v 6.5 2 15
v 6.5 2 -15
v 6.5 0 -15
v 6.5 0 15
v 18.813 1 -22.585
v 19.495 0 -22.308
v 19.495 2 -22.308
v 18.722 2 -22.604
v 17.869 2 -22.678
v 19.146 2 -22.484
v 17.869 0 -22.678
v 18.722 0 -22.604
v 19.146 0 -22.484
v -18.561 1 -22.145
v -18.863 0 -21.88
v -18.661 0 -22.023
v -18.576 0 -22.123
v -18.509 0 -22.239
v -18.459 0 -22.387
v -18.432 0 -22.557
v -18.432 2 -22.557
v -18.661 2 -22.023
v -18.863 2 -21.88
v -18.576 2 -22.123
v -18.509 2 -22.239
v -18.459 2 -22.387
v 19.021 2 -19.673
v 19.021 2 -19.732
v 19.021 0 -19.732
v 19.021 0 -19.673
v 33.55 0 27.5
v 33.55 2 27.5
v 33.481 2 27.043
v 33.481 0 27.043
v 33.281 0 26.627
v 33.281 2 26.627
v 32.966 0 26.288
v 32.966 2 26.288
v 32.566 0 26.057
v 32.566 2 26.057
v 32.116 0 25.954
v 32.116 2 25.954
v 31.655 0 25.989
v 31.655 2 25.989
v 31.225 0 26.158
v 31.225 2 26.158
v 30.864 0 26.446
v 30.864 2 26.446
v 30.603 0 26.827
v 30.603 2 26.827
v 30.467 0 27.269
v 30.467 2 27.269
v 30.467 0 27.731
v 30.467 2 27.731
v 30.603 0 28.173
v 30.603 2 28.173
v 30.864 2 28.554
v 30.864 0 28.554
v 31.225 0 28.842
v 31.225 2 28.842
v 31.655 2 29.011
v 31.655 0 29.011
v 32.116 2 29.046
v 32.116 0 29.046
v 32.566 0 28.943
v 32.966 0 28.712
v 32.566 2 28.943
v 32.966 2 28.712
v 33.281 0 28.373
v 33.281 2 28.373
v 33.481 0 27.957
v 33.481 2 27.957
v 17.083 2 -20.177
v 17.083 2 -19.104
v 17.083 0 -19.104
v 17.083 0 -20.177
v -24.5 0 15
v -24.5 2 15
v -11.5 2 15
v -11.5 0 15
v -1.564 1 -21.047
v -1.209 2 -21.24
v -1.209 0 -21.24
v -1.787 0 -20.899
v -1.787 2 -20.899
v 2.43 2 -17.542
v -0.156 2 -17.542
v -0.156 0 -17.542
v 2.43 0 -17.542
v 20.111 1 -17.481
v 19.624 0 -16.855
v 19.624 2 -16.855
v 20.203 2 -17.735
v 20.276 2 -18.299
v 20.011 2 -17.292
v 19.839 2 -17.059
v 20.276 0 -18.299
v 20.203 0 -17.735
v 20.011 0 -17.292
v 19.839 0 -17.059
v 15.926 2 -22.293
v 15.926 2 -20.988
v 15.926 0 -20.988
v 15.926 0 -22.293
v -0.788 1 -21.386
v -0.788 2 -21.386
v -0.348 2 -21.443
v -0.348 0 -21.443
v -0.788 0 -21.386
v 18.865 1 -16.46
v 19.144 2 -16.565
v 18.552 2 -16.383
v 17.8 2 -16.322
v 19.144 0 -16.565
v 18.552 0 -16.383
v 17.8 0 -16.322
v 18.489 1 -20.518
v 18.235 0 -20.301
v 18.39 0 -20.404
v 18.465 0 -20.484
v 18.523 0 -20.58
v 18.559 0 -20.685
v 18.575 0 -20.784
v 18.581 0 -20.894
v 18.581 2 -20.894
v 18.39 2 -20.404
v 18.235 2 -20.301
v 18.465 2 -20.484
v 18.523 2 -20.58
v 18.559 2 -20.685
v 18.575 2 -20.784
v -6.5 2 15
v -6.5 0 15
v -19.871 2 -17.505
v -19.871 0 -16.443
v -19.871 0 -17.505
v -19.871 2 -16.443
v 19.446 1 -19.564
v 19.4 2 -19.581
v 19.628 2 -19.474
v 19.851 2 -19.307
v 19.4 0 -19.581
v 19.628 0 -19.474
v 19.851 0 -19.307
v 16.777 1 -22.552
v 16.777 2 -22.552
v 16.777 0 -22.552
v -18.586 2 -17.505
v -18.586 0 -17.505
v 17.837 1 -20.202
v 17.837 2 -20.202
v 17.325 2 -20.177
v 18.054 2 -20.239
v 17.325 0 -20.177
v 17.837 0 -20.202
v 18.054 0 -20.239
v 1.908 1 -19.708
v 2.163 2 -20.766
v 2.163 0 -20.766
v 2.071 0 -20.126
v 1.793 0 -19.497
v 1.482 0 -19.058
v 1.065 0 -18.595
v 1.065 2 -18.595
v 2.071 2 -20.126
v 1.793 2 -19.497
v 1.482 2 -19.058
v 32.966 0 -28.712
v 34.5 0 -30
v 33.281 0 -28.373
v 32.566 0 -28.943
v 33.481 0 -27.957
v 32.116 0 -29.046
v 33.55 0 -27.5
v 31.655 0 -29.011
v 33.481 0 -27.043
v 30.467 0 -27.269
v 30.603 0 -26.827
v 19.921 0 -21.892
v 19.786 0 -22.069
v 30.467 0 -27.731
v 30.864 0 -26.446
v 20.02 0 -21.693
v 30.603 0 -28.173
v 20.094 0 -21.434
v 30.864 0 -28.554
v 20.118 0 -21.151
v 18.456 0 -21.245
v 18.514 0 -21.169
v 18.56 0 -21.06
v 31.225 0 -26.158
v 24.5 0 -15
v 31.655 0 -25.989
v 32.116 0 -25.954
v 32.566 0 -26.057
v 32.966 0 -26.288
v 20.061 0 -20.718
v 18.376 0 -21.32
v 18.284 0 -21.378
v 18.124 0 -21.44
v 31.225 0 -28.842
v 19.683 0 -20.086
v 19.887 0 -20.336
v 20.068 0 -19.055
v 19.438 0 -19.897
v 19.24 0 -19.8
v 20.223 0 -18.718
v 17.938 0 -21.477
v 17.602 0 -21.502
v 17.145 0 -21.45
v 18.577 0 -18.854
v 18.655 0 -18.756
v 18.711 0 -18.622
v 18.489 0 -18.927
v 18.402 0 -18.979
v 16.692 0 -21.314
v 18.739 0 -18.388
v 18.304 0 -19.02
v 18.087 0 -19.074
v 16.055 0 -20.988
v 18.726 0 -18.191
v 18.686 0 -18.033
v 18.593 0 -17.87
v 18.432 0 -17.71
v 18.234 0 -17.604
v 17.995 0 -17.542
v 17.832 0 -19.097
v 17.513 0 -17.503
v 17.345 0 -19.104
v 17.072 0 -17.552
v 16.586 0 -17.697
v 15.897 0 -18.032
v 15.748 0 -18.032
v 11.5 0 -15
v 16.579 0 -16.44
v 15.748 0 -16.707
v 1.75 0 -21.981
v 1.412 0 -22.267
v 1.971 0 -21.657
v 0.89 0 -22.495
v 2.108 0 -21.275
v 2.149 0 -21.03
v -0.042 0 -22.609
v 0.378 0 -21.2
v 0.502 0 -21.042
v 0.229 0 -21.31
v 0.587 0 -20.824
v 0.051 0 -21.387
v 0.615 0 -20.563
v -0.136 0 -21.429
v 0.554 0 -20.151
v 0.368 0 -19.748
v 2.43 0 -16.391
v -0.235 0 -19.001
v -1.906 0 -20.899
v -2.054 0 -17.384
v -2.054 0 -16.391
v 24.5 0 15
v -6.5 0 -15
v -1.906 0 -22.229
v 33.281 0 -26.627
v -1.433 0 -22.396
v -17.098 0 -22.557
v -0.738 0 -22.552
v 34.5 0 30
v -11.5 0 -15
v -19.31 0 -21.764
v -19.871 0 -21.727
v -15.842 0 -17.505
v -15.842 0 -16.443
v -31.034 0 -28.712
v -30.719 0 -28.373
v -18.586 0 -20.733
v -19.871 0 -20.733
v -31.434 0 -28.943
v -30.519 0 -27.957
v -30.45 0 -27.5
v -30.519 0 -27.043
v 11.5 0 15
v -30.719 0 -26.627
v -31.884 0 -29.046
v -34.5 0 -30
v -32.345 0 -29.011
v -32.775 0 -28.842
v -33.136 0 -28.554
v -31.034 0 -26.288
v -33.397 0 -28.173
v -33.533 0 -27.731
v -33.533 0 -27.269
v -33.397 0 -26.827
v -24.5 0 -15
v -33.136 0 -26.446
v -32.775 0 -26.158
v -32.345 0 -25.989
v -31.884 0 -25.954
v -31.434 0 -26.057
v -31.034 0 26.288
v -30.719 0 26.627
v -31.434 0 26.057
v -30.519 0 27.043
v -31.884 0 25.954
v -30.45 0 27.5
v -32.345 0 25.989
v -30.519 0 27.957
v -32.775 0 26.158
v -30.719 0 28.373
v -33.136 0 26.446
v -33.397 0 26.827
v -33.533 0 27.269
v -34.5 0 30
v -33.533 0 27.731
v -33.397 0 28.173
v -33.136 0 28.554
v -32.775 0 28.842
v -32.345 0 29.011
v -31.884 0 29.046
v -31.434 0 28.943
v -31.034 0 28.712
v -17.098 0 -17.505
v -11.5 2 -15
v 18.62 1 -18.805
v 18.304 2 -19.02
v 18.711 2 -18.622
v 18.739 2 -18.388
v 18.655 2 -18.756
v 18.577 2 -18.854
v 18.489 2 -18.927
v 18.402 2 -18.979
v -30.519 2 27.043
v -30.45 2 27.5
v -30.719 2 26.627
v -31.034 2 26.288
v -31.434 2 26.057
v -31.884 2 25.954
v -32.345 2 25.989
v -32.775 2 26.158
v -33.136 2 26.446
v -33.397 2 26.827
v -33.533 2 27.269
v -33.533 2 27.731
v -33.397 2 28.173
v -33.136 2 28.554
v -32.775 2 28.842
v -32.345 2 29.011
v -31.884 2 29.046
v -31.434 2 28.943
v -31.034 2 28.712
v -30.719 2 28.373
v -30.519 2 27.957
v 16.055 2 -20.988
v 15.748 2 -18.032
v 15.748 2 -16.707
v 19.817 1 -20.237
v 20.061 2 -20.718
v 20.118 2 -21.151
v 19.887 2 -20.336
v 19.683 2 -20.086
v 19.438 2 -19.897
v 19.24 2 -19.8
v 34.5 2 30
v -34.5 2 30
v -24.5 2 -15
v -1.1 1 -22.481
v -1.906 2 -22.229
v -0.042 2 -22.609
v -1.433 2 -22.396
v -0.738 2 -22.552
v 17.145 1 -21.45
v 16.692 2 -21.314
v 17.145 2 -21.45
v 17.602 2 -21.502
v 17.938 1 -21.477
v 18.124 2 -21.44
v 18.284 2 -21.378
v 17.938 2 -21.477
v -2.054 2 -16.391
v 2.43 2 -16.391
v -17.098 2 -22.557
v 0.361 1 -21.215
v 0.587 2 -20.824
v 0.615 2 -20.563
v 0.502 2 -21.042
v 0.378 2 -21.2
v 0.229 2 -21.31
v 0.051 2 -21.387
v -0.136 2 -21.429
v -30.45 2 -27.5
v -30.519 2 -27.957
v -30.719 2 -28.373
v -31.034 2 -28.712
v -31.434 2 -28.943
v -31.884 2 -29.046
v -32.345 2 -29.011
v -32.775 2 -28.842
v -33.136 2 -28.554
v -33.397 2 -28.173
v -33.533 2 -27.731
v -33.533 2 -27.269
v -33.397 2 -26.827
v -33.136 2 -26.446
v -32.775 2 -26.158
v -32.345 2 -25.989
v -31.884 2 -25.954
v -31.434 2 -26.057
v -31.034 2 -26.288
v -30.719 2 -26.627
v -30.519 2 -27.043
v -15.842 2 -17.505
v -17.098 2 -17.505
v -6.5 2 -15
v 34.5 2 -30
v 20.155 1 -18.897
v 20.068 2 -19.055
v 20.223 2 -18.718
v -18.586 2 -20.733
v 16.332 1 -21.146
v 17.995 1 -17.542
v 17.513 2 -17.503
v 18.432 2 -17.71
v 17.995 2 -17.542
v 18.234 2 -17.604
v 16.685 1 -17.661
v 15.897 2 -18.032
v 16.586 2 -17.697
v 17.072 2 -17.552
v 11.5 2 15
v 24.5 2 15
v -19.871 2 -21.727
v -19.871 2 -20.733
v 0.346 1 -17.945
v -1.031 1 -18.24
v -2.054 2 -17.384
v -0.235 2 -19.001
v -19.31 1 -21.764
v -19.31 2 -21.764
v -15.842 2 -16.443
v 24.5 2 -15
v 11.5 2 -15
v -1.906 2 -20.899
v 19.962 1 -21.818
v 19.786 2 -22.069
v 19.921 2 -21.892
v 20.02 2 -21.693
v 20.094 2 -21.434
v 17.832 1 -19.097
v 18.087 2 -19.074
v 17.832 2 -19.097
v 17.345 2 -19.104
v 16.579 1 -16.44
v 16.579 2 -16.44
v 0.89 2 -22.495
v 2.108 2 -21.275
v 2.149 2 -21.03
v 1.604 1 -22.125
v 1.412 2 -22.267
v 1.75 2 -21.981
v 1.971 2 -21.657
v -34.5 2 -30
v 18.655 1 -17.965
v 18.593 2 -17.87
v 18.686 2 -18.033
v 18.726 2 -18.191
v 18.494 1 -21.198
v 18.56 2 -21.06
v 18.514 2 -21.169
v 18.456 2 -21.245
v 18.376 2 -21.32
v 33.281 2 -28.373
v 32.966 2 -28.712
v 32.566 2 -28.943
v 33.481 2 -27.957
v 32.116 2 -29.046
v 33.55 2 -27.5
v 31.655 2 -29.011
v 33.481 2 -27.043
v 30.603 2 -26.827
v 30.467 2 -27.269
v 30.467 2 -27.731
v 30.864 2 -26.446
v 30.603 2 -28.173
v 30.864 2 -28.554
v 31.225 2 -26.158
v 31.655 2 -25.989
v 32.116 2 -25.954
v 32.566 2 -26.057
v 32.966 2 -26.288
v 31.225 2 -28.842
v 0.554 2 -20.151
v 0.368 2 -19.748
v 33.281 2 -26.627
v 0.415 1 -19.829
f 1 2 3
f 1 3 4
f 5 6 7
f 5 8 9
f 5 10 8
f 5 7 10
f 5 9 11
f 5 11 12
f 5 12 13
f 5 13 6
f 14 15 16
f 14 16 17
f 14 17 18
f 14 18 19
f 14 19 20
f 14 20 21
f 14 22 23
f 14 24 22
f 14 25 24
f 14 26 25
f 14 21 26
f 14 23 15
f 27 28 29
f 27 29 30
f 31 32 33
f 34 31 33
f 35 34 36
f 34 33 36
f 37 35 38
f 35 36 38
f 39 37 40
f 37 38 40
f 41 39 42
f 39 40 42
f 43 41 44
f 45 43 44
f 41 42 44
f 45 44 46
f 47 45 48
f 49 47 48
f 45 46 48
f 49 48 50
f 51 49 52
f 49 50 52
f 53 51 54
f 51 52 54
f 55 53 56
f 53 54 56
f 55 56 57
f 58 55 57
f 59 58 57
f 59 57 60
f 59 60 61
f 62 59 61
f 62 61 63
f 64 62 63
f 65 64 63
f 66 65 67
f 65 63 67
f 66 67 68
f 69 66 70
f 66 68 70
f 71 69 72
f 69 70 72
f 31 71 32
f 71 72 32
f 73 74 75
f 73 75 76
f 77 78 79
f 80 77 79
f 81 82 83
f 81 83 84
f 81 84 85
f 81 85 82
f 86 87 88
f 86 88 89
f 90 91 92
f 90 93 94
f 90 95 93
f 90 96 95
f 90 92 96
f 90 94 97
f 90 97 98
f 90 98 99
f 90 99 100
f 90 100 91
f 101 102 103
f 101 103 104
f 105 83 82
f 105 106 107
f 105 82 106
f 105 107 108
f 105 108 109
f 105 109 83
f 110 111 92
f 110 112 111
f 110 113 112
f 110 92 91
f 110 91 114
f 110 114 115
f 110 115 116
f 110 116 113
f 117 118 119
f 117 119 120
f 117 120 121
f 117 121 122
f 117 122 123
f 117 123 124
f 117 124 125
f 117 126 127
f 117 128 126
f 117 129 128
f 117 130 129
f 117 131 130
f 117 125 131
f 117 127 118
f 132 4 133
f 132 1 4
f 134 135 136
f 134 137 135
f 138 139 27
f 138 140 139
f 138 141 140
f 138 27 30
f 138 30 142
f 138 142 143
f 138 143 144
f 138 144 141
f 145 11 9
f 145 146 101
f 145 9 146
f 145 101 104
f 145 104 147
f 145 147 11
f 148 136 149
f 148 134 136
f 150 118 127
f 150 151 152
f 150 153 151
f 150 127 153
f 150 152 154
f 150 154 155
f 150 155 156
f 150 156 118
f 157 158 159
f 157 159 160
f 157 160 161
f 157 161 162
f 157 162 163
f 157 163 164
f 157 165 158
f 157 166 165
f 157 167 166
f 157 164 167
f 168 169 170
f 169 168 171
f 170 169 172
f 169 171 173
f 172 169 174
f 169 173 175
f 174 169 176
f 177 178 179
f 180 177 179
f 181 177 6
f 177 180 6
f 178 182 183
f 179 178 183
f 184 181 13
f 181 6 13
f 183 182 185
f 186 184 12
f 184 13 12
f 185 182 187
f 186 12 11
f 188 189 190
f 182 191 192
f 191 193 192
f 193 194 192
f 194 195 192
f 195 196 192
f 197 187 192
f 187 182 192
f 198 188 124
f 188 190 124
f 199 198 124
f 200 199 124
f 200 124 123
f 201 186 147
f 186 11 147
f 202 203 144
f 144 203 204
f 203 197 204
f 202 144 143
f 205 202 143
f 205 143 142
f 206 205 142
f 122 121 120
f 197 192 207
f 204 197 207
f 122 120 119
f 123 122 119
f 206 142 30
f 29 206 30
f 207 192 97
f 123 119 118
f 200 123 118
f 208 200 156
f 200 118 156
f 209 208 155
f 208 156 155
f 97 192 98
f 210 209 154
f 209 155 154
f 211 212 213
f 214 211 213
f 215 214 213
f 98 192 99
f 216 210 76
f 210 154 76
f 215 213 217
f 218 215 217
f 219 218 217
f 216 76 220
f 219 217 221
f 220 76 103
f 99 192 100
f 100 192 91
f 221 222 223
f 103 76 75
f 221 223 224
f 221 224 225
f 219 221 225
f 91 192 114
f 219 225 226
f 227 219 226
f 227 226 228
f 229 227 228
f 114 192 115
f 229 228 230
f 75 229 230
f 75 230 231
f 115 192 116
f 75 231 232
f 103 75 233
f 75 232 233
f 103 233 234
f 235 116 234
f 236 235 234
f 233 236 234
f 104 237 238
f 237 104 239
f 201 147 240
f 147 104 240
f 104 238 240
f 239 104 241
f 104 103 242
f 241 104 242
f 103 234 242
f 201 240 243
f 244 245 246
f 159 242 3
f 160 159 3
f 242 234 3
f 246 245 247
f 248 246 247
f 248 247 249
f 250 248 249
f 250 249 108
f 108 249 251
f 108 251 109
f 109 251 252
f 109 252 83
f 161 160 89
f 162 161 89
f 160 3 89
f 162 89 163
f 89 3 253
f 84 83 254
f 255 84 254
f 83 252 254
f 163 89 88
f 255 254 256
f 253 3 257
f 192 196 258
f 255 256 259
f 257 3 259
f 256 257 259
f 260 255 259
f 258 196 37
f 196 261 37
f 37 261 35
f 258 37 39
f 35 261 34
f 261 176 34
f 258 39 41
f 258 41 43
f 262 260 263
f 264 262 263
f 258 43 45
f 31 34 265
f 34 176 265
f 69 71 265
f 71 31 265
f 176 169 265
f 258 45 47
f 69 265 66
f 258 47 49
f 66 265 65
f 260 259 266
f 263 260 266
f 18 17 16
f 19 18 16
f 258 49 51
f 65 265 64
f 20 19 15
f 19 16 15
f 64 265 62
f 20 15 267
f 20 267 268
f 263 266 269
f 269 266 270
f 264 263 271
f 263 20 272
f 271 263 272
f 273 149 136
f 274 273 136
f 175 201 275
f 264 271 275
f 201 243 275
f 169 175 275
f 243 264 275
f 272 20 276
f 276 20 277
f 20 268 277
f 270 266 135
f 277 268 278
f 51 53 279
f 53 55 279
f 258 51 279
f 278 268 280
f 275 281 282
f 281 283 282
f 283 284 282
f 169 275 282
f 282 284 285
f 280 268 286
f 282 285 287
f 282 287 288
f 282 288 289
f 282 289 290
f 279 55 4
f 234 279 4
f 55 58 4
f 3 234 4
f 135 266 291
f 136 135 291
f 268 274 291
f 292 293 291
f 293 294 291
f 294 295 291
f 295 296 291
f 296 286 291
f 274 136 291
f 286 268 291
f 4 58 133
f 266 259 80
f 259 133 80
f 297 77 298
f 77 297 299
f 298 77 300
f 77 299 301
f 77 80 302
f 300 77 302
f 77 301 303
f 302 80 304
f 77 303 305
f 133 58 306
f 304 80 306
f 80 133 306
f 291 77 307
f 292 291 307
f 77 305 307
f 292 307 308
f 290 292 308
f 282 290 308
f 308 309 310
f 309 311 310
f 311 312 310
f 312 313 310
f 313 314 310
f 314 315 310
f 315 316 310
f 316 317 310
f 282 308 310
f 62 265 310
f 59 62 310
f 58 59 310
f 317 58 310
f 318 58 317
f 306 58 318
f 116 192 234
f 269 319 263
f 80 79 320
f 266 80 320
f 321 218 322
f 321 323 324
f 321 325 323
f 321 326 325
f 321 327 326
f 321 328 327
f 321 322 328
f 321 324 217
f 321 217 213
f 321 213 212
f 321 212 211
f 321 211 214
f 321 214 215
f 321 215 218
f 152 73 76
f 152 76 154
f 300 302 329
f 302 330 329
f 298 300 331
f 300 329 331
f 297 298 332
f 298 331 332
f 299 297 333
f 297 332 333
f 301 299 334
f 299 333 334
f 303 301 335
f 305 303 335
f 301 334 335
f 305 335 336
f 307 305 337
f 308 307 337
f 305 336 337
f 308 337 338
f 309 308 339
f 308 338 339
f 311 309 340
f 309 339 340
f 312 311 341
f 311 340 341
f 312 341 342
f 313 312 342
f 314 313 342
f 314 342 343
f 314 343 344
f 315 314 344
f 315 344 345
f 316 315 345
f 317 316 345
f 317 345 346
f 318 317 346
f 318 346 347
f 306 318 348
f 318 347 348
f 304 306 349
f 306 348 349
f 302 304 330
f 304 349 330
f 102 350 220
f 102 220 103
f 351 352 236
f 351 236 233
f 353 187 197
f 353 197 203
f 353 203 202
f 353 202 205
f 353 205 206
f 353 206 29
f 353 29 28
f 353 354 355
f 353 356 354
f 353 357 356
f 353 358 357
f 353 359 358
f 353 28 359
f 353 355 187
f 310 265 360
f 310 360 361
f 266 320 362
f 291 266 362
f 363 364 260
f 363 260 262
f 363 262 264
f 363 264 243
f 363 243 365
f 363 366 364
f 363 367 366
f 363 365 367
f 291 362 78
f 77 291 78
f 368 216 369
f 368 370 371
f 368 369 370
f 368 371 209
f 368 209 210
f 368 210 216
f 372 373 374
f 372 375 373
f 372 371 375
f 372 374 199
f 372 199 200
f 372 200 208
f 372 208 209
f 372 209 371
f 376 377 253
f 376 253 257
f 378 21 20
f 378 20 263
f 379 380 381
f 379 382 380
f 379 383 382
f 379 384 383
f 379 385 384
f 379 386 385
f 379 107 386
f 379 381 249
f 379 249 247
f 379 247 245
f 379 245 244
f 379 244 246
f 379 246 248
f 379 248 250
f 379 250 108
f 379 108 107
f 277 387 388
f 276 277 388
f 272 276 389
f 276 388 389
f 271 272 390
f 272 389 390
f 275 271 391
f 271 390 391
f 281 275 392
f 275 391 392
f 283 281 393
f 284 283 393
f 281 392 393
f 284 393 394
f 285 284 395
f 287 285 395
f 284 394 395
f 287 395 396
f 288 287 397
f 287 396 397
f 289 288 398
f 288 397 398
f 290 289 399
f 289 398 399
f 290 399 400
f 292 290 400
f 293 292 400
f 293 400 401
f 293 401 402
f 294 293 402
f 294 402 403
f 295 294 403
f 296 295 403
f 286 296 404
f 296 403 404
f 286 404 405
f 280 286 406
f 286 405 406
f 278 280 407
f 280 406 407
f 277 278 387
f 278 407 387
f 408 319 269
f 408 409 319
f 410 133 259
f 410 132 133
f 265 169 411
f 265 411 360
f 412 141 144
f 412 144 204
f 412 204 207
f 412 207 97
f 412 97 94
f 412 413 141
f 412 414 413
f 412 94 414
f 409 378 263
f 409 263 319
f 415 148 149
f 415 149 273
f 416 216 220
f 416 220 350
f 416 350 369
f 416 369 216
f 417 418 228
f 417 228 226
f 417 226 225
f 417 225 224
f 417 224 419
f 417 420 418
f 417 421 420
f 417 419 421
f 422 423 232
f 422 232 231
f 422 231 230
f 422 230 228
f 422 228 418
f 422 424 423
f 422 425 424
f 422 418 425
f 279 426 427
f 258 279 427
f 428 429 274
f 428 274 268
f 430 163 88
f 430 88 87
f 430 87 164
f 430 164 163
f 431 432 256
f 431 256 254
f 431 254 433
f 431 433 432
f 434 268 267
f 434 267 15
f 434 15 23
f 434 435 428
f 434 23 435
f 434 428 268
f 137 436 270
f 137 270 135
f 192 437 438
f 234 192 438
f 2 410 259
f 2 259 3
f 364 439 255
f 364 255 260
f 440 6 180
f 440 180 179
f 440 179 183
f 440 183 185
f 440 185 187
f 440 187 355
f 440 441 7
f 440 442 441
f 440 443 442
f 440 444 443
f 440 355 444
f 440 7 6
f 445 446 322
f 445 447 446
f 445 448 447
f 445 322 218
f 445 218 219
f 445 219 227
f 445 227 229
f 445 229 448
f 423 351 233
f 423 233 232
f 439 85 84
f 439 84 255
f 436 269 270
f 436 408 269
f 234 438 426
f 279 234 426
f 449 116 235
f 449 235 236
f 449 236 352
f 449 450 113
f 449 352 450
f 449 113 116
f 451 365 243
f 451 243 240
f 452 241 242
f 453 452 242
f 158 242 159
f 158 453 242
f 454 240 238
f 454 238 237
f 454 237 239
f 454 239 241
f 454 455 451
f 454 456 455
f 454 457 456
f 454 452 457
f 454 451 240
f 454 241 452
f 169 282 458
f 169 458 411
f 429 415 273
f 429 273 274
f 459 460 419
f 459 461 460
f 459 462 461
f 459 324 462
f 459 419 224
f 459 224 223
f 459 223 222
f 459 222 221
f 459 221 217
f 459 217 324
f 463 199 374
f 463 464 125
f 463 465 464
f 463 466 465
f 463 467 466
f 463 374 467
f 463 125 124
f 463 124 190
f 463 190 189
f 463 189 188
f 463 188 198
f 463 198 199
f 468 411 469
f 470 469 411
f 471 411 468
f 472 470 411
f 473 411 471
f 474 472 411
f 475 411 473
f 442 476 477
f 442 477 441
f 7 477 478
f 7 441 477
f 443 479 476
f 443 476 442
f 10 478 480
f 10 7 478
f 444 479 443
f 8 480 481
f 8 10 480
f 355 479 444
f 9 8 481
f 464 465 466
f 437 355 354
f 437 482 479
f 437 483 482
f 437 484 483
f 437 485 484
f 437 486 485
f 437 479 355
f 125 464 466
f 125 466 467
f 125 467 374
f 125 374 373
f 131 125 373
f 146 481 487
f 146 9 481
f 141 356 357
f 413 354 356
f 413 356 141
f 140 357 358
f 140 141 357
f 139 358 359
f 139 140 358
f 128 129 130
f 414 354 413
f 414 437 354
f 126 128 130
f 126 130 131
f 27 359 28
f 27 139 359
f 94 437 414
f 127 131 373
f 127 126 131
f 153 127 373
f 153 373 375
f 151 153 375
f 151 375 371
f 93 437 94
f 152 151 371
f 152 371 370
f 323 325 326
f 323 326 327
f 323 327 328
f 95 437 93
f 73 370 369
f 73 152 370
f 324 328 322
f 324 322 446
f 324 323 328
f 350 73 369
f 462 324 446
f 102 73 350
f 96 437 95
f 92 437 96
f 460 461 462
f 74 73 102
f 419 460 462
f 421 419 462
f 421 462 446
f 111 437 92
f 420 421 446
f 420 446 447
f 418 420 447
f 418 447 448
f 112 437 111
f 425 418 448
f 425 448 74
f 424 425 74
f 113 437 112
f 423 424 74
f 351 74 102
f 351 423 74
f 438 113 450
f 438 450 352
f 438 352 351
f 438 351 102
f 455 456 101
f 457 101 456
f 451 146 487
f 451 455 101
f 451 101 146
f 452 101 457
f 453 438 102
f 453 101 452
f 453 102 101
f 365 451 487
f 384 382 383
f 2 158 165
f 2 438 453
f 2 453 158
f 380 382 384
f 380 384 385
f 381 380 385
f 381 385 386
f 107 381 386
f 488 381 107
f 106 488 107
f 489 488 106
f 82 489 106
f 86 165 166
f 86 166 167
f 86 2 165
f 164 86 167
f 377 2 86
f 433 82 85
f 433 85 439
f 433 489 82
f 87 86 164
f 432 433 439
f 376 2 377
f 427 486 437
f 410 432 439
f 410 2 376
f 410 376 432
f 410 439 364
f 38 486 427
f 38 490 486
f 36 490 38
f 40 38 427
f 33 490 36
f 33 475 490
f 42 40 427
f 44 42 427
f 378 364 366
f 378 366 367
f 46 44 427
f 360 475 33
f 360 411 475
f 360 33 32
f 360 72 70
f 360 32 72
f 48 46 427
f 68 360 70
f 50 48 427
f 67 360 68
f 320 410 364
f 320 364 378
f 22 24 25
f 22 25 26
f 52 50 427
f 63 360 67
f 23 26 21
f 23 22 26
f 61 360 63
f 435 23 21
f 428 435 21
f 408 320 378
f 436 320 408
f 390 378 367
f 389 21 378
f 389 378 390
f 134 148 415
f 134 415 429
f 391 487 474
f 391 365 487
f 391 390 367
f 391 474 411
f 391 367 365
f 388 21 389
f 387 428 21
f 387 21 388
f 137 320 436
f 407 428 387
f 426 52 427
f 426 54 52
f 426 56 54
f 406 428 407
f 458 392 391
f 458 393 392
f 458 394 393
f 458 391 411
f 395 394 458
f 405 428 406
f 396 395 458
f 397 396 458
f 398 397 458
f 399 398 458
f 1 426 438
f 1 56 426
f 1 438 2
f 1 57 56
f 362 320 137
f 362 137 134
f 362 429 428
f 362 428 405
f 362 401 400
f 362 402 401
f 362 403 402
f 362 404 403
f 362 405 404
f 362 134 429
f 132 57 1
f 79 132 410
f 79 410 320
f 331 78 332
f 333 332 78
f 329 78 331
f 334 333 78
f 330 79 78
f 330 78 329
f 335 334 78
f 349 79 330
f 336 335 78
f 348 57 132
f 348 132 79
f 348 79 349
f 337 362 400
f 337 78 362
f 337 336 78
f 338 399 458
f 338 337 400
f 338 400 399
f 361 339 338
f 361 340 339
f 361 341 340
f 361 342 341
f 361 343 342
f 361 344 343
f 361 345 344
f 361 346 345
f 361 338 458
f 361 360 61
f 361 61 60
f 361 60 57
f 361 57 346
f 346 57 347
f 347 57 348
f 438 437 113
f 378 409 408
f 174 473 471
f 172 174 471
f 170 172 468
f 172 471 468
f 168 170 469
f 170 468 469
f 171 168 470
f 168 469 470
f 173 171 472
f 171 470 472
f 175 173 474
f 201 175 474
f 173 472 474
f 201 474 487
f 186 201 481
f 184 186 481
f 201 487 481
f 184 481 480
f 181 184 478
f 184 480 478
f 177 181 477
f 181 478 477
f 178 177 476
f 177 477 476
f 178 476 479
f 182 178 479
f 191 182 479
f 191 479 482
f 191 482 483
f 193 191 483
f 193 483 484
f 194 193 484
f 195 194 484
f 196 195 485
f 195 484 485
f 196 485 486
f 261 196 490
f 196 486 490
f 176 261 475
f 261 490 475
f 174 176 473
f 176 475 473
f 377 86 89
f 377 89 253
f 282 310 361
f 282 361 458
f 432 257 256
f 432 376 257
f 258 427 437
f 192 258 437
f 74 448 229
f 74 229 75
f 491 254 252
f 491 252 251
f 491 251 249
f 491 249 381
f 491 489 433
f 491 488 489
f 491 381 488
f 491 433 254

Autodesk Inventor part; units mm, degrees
ref_plane "YZ Plane" through (0, 0, 0) normal (1, 0, 0) x (0, 1, 0)
ref_plane "XZ Plane" through (0, 0, 0) normal (0, 1, 0) x (-1, 0, 0)
sketch "Sketch1" plane through (0, 0, 0) normal (0, 1, 0) x (-1, 0, 0)
  line L0 (-34.5, 30) -> (34.5, 30)
  line L1 (34.5, 30) -> (34.5, -30)
  line L2 (34.5, -30) -> (-34.5, -30)
  line L3 (-34.5, -30) -> (-34.5, 30)
  line L4 (-34.5, 30) -> (34.5, -30) construction
  line L5 (34.5, 30) -> (-34.5, -30) construction
  point P0 (0, 0)
  dimension "d0" = 69
  dimension "d1" = 60
extrude "Extrusion1" add sketch "Sketch1" along normal blind 2
sketch "Sketch2" plane through (0, 2, 0) normal (0, 1, 0) x (1, 0, 0)
  line L0 (6.5, -15) -> (-6.5, -15)
  line L1 (-6.5, -15) -> (-6.5, 15)
  line L2 (-6.5, 15) -> (6.5, 15)
  line L3 (6.5, 15) -> (6.5, -15)
  line L4 (6.5, -15) -> (-6.5, 15) construction
  line L5 (-6.5, -15) -> (6.5, 15) construction
  line L6 (-24.5, -15) -> (-11.5, -15)
  line L7 (-11.5, -15) -> (-11.5, 15)
  line L8 (-11.5, 15) -> (-24.5, 15)
  line L9 (-24.5, 15) -> (-24.5, -15)
  line L10 (-24.5, -15) -> (-11.5, 15) construction
  line L11 (-11.5, -15) -> (-24.5, 15) construction
  line L12 (-24.5, 23) -> (-11.5, 23) construction
  line L13 (-11.5, 23) -> (-11.5, 16) construction
  line L14 (-11.5, 16) -> (-24.5, 16) construction
  line L15 (-24.5, 16) -> (-24.5, 23) construction
  line L16 (-6.5, 23) -> (6.5, 23) construction
  line L17 (6.5, 23) -> (6.5, 16) construction
  line L18 (6.5, 16) -> (-6.5, 16) construction
  line L19 (-6.5, 16) -> (-6.5, 23) construction
  line L20 (11.5, -15) -> (24.5, -15)
  line L21 (24.5, -15) -> (24.5, 15)
  line L22 (24.5, 15) -> (11.5, 15)
  line L23 (11.5, 15) -> (11.5, -15)
  line L24 (11.5, -15) -> (24.5, 15) construction
  line L25 (24.5, -15) -> (11.5, 15) construction
  line L26 (11.5, 23) -> (24.5, 23) construction
  line L27 (24.5, 23) -> (24.5, 16) construction
  line L28 (24.5, 16) -> (11.5, 16) construction
  line L29 (11.5, 16) -> (11.5, 23) construction
  circle A0 centre (32, -27.5) radius 1.55
  line L30 (-34.5, -30) -> (34.5, -30) projected
  line L31 (34.5, -30) -> (34.5, 30) projected
  circle A1 centre (32, 27.5) radius 1.55
  circle A2 centre (-32, 27.5) radius 1.55
  circle A3 centre (-32, -27.5) radius 1.55
  line L32 (34.5, 30) -> (-34.5, 30) projected
  line L33 (-34.5, 30) -> (-34.5, -30) projected
  line L34 (-15.8423, 16.4426) -> (-19.871, 16.4426)
  line L35 (-19.871, 16.4426) -> (-19.871, 17.5054)
  line L36 (-19.871, 17.5054) -> (-18.5858, 17.5054)
  line L37 (-18.5858, 17.5054) -> (-18.5858, 20.7333)
  line L38 (-18.5858, 20.7333) -> (-19.871, 20.7333)
  line L39 (-19.871, 20.7333) -> (-19.871, 21.7269)
  spline S0 degree 2 poles (-19.871, 21.7269) (-19.5893, 21.7269) (-19.0307, 21.8011) (-18.8626, 21.8802) knots 0 0 0 1 2 2 2
  spline S1 degree 2 poles (-18.8626, 21.8802) (-18.6698, 21.9791) (-18.4523, 22.3103) (-18.4325, 22.5574) knots 0 0 0 1 2 2 2
  line L40 (-18.4325, 22.5574) -> (-17.0979, 22.5574)
  line L41 (-17.0979, 22.5574) -> (-17.0979, 17.5054)
  line L42 (-17.0979, 17.5054) -> (-15.8423, 17.5054)
  line L43 (-15.8423, 17.5054) -> (-15.8423, 16.4426)
  line L44 (2.4296, 16.3907) -> (-2.0539, 16.3907)
  line L45 (-2.0539, 16.3907) -> (-2.0539, 17.3843)
  spline S2 degree 2 poles (-2.0539, 17.3843) (-1.4855, 17.8391) (-0.5759, 18.6399) (-0.2348, 19.0007) knots 0 0 0 1 2 2 2
  spline S3 degree 2 poles (-0.2348, 19.0007) (0.215, 19.4703) (0.6154, 20.1871) (0.6154, 20.5628) knots 0 0 0 1 2 2 2
  spline S4 degree 2 poles (0.6154, 20.5628) (0.6154, 20.9879) (0.1063, 21.4427) (-0.3485, 21.4427) knots 0 0 0 1 2 2 2
  spline S5 degree 2 poles (-0.3485, 21.4427) (-0.5808, 21.4427) (-0.9961, 21.329) (-1.2086, 21.24) knots 0 0 0 1 2 2 2
  spline S6 degree 2 poles (-1.2086, 21.24) (-1.4162, 21.1461) (-1.7128, 20.9484) (-1.787, 20.8989) knots 0 0 0 1 2 2 2
  line L46 (-1.787, 20.8989) -> (-1.9056, 20.8989)
  line L47 (-1.9056, 20.8989) -> (-1.9056, 22.2287)
  spline S7 degree 2 poles (-1.9056, 22.2287) (-1.6486, 22.3523) (-0.5512, 22.6093) (-0.042, 22.6093) knots 0 0 0 1 2 2 2
  spline S8 degree 2 poles (-0.042, 22.6093) (1.0455, 22.6093) (2.1627, 21.6404) (2.1627, 20.7655) knots 0 0 0 1 2 2 2
  spline S9 degree 2 poles (2.1627, 20.7655) (2.1627, 20.2267) (1.6535, 19.1886) (1.0653, 18.5954) knots 0 0 0 1 2 2 2
  spline S10 degree 2 poles (1.0653, 18.5954) (0.6945, 18.2296) (-0.0025, 17.6611) (-0.1557, 17.5425) knots 0 0 0 1 2 2 2
  line L48 (-0.1557, 17.5425) -> (2.4296, 17.5425)
  line L49 (2.4296, 17.5425) -> (2.4296, 16.3907)
  spline S11 degree 2 poles (20.2764, 18.2988) (20.2764, 17.8489) (19.9452, 17.1124) (19.6239, 16.8553) knots 0 0 0 1 2 2 2
  spline S12 degree 2 poles (19.6239, 16.8553) (19.3026, 16.5983) (18.4276, 16.3215) (17.7998, 16.3215) knots 0 0 0 1 2 2 2
  spline S13 degree 2 poles (17.7998, 16.3215) (17.088, 16.3215) (16.0697, 16.5588) (15.7483, 16.7071) knots 0 0 0 1 2 2 2
  line L50 (15.7483, 16.7071) -> (15.7483, 18.0318)
  line L51 (15.7483, 18.0318) -> (15.8966, 18.0318)
  spline S14 degree 2 poles (15.8966, 18.0318) (16.2328, 17.8193) (17.1374, 17.5029) (17.5131, 17.5029) knots 0 0 0 1 2 2 2
  spline S15 degree 2 poles (17.5131, 17.5029) (17.7355, 17.5029) (18.2546, 17.582) (18.4325, 17.7105) knots 0 0 0 1 2 2 2
  spline S16 degree 2 poles (18.4325, 17.7105) (18.5709, 17.8143) (18.739, 18.1159) (18.739, 18.3878) knots 0 0 0 1 2 2 2
  spline S17 degree 2 poles (18.739, 18.3878) (18.739, 18.6596) (18.5017, 18.9513) (18.304, 19.0205) knots 0 0 0 1 2 2 2
  spline S18 degree 2 poles (18.304, 19.0205) (18.1063, 19.0897) (17.5576, 19.1045) (17.345, 19.1045) knots 0 0 0 1 2 2 2
  line L52 (17.345, 19.1045) -> (17.083, 19.1045)
  line L53 (17.083, 19.1045) -> (17.083, 20.1772)
  line L54 (17.083, 20.1772) -> (17.3252, 20.1772)
  spline S19 degree 2 poles (17.3252, 20.1772) (17.6021, 20.1772) (18.0717, 20.2267) (18.2348, 20.3008) knots 0 0 0 1 2 2 2
  spline S20 degree 2 poles (18.2348, 20.3008) (18.3979, 20.3799) (18.5808, 20.6567) (18.5808, 20.894) knots 0 0 0 1 2 2 2
  spline S21 degree 2 poles (18.5808, 20.894) (18.5808, 21.0818) (18.4078, 21.3142) (18.2842, 21.3784) knots 0 0 0 1 2 2 2
  spline S22 degree 2 poles (18.2842, 21.3784) (18.1359, 21.4526) (17.7405, 21.502) (17.6021, 21.502) knots 0 0 0 1 2 2 2
  spline S23 degree 2 poles (17.6021, 21.502) (17.3796, 21.502) (16.91, 21.3982) (16.6925, 21.3142) knots 0 0 0 1 2 2 2
  spline S24 degree 2 poles (16.6925, 21.3142) (16.5195, 21.2499) (16.1438, 21.0423) (16.0548, 20.9879) knots 0 0 0 1 2 2 2
  line L55 (16.0548, 20.9879) -> (15.9263, 20.9879)
  line L56 (15.9263, 20.9879) -> (15.9263, 22.2929)
  spline S25 degree 2 poles (15.9263, 22.2929) (16.2427, 22.4264) (17.3104, 22.6785) (17.869, 22.6785) knots 0 0 0 1 2 2 2
  spline S26 degree 2 poles (17.869, 22.6785) (18.4128, 22.6785) (19.2136, 22.4907) (19.4953, 22.3078) knots 0 0 0 1 2 2 2
  spline S27 degree 2 poles (19.4953, 22.3078) (19.8068, 22.115) (20.1182, 21.5218) (20.1182, 21.1511) knots 0 0 0 1 2 2 2
  spline S28 degree 2 poles (20.1182, 21.1511) (20.1182, 20.6271) (19.5151, 19.846) (19.0208, 19.7323) knots 0 0 0 1 2 2 2
  line L57 (19.0208, 19.7323) -> (19.0208, 19.673)
  spline S29 degree 2 poles (19.0208, 19.673) (19.2383, 19.6434) (19.6535, 19.4852) (19.8513, 19.3072) knots 0 0 0 1 2 2 2
  spline S30 degree 2 poles (19.8513, 19.3072) (20.0342, 19.149) (20.2764, 18.6448) (20.2764, 18.2988) knots 0 0 0 1 2 2 2
  point P0 (0, 0)
  point P1 (-18, 0)
  point P2 (18, 0)
  dimension "d4" = 13
  dimension "d5" = 30
  dimension "d8" = 5
  dimension "d9" = 1
  dimension "d10" = 8
  dimension "d13" = 5
  dimension "d15" = 3.1
  dimension "d16" = 2.5
  dimension "d17" = 2.5
  dimension "d18" = 2.5
  dimension "d19" = 2.5
extrude "Extrusion2" cut sketch "Sketch2" against normal blind 2 contours L0 L1 L2 L3 | L9 L8 L7 L6 | L23 L22 L21 L20 | A0 | A1 | A2 | A3 | L34 L35 L36 L37 L38 L39 S0 S1 L40 L41 L42 L43 | L44 L45 S2 S3 S4 S5 S6 L46 L47 S7 S8 S9 S10 L48 L49 | S11 S12 S13 L50 L51 S14 S15 S16 S17 S18 L52 L53 L54 S19 S20 S21 S22 S23 S24 L55 L56 S25 S26 S27 S28 L57 S29 S30
ref_plane "Work Plane2" through (0, 0, 30) normal (1, 0, 0) x (0, 0, -1)
equation "\"d4\" = switch_len_at_clip"
equation "\"d5\" = switch_width_at_clip"
equation "\"switch_len_at_clip\" = 13"
equation "\"switch_width_at_clip\" = 30"
equation "\"pannel_height\" = 1"
properties part number "panel_switches"
